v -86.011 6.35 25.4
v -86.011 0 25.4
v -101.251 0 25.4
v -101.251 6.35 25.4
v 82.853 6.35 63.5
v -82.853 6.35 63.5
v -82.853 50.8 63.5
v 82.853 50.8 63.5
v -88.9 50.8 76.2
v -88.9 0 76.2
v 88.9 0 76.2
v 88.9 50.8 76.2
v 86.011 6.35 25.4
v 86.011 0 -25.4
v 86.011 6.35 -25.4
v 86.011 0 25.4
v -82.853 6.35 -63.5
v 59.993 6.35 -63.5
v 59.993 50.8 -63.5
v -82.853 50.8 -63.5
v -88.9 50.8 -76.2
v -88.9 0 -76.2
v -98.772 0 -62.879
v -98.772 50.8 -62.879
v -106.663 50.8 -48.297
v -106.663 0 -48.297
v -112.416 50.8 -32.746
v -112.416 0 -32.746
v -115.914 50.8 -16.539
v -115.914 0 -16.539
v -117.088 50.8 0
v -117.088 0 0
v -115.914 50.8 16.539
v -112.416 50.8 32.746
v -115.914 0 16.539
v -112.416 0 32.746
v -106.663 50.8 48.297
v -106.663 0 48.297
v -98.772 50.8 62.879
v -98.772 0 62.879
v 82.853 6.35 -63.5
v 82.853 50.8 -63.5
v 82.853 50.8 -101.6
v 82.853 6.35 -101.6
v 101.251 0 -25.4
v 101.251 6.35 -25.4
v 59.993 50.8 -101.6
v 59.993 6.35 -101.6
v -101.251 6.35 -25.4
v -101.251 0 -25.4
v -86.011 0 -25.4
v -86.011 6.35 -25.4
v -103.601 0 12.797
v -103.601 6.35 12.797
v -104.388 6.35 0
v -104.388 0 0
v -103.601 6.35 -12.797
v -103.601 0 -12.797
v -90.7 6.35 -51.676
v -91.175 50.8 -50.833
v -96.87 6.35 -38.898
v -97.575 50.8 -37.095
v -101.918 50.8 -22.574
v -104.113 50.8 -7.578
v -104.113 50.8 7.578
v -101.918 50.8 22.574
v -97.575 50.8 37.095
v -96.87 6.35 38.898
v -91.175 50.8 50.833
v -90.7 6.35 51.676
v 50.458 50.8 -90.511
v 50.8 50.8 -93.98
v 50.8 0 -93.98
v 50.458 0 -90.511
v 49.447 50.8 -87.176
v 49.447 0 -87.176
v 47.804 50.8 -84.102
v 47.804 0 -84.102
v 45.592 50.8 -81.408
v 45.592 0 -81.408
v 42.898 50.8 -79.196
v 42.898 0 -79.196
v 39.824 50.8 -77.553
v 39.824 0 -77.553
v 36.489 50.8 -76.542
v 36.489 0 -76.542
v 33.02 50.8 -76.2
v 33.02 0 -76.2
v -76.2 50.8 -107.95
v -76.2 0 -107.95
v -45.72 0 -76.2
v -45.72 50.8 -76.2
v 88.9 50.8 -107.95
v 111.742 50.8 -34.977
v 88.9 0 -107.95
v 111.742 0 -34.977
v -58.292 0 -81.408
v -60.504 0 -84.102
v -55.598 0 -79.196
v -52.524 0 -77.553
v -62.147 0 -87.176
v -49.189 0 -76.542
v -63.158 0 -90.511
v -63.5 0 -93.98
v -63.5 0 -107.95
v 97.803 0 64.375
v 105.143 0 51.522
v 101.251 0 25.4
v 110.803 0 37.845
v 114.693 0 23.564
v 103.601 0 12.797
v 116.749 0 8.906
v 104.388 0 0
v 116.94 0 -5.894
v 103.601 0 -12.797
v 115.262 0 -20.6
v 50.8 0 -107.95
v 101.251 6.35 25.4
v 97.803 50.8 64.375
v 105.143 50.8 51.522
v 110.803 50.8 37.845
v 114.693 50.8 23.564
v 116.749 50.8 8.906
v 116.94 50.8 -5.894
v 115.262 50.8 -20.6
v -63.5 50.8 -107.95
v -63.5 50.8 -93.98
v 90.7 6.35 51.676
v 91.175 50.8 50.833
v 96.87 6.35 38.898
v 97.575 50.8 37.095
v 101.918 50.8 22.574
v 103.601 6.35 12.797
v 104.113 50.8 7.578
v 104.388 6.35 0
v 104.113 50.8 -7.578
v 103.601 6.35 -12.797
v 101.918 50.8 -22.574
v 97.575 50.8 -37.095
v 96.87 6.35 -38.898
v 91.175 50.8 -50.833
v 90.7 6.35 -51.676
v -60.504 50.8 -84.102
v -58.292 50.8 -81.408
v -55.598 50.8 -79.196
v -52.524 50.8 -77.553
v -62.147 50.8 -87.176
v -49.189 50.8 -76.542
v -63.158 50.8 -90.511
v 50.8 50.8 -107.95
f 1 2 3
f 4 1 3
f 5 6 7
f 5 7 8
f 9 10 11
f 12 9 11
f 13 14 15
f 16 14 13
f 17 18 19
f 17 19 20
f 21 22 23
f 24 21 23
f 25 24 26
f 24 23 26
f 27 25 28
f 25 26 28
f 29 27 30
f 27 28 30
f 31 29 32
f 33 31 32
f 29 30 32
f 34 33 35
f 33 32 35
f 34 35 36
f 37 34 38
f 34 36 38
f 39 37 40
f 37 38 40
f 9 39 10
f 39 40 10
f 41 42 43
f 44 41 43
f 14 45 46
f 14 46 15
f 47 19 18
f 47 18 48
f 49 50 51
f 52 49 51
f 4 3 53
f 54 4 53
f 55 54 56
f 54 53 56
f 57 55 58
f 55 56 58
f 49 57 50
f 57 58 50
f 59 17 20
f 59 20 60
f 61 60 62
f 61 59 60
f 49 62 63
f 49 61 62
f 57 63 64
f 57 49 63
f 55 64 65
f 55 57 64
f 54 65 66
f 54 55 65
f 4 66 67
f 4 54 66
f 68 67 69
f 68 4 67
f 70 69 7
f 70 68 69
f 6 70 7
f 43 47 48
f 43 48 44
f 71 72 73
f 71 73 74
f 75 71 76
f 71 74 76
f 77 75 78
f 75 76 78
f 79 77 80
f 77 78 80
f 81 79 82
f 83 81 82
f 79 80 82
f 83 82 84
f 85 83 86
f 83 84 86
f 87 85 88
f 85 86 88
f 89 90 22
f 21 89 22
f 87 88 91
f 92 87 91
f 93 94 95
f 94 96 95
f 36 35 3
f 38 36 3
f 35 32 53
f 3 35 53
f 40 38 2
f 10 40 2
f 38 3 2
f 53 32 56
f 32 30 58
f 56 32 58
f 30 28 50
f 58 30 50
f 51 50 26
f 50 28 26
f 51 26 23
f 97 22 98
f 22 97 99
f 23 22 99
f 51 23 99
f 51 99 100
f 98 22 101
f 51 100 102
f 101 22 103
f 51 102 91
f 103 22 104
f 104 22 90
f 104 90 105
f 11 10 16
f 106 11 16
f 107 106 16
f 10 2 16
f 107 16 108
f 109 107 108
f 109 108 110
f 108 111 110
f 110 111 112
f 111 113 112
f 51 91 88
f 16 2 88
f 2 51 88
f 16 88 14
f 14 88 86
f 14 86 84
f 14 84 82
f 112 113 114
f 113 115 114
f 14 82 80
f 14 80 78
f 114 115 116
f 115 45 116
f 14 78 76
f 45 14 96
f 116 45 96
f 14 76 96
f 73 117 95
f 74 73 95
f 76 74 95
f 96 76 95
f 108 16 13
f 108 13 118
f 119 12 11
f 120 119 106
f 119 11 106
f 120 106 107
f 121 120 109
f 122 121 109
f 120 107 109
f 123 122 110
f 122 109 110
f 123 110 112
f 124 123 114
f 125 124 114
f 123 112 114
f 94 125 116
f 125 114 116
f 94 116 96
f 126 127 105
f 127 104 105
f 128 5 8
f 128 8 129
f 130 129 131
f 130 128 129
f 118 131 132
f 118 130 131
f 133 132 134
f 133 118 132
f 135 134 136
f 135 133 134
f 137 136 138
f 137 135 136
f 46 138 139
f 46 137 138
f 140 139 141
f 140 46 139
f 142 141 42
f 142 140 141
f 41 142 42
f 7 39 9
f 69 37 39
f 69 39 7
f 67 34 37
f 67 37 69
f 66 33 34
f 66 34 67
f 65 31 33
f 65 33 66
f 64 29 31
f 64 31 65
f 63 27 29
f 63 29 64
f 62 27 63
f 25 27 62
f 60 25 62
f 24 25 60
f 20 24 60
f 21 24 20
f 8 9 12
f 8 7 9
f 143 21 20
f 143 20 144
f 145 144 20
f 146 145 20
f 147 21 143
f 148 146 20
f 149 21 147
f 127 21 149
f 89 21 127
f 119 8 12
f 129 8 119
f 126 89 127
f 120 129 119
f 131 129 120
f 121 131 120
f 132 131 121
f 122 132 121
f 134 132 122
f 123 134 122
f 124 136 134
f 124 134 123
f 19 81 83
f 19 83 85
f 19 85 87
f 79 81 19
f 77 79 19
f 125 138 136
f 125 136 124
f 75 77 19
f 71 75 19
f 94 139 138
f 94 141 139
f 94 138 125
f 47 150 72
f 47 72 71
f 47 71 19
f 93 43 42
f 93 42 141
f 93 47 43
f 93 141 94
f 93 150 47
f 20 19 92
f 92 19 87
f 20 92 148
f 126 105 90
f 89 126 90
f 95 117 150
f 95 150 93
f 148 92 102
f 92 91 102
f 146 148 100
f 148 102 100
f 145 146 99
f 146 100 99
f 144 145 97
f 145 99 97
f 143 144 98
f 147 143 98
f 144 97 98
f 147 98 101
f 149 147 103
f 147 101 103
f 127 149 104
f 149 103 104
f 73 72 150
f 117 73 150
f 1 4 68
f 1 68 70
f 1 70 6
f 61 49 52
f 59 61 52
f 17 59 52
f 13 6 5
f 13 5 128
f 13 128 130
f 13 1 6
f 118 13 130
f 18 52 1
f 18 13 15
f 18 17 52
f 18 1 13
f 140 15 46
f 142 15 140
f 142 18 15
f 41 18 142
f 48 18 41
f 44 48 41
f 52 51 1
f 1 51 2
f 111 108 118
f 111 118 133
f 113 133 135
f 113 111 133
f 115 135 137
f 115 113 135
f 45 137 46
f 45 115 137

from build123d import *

# Parameters (mm, degrees)
BOSS_EXTRUDE1_DEPTH = 6.35
BOSS_EXTRUDE2_DEPTH = 44.45
SKETCH4_W           = 12.7
SKETCH4_H           = 31.75
BOSS_EXTRUDE4_DEPTH = 50.8
SKETCH5_W           = 22.86
SKETCH5_H           = 38.1
CUT_EXTRUDE1_DEPTH  = 44.45
FILLET3_R           = 17.78


with BuildPart() as part:
    # Sketch1 → Boss-Extrude1 (new body)
    with BuildSketch(Plane(origin=(0, 0, 0), x_dir=(1, 0, 0), z_dir=(0, 1, 0))):
        with BuildLine():
            Line((-88.9, -76.2), (88.9, -76.2))
            ThreePointArc((88.9, -76.2), (114.692568029, -23.564058203), (111.741834586, 34.977312694))
            Line((111.741834586, 34.977312694), (88.9, 107.95))
            Line((88.9, 107.95), (63.5, 107.95))
            Line((63.5, 107.95), (63.5, 76.2))
            Line((63.5, 76.2), (-63.5, 76.2))
            Line((-63.5, 76.2), (-63.5, 107.95))
            Line((-63.5, 107.95), (-76.2, 107.95))
            Line((-76.2, 107.95), (-88.9, 76.2))
            ThreePointArc((-88.9, 76.2), (-117.088214608, 0), (-88.9, -76.2))
        make_face()
        with BuildLine():
            Line((-101.250873324, 25.4), (-86.010873324, 25.4))
            Line((-86.010873324, 25.4), (-86.010873324, -25.4))
            Line((-86.010873324, -25.4), (-101.250873324, -25.4))
            ThreePointArc((-101.250873324, -25.4), (-104.388214608, 0), (-101.250873324, 25.4))
        make_face(mode=Mode.SUBTRACT)
        with BuildLine():
            Line((86.010873324, -25.4), (101.250873324, -25.4))
            ThreePointArc((101.250873324, -25.4), (104.388214608, 0), (101.250873324, 25.4))
            Line((101.250873324, 25.4), (86.010873324, 25.4))
            Line((86.010873324, 25.4), (86.010873324, -25.4))
        make_face(mode=Mode.SUBTRACT)
    extrude(amount=BOSS_EXTRUDE1_DEPTH)

    # Sketch2 → Boss-Extrude2 (add)
    with BuildSketch(Plane(origin=(0, 6.35, 0), x_dir=(1, 0, 0), z_dir=(0, 1, 0))):
        with BuildLine():
            Line((-88.9, -76.2), (88.9, -76.2))
            ThreePointArc((88.9, -76.2), (114.692568029, -23.564058203), (111.741834586, 34.977312694))
            Line((111.741834586, 34.977312694), (88.9, 107.95))
            Line((88.9, 107.95), (63.5, 107.95))
            Line((63.5, 107.95), (63.5, 76.2))
            Line((63.5, 76.2), (-63.5, 76.2))
            Line((-63.5, 76.2), (-63.5, 107.95))
            Line((-63.5, 107.95), (-76.2, 107.95))
            Line((-76.2, 107.95), (-88.9, 76.2))
            ThreePointArc((-88.9, 76.2), (-117.088214608, 0), (-88.9, -76.2))
        make_face()
        with BuildLine():
            Line((-82.853179474, -63.5), (82.853179474, -63.5))
            ThreePointArc((82.853179474, -63.5), (104.388214608, 0), (82.853179474, 63.5))
            Line((82.853179474, 63.5), (-82.853179474, 63.5))
            ThreePointArc((-82.853179474, 63.5), (-104.388214608, 0), (-82.853179474, -63.5))
        make_face(mode=Mode.SUBTRACT)
    extrude(amount=BOSS_EXTRUDE2_DEPTH)

    # Sketch4 → Boss-Extrude4 (add)
    with BuildSketch(Plane(origin=(0, 50.8, 0), x_dir=(1, 0, 0), z_dir=(0, 1, 0))):
        with Locations((57.15, 92.075)):
            Rectangle(SKETCH4_W, SKETCH4_H)
    extrude(amount=-BOSS_EXTRUDE4_DEPTH)

    # Sketch5 → Cut-Extrude1 (cut)
    with BuildSketch(Plane(origin=(0, 50.8, 0), x_dir=(1, 0, 0), z_dir=(0, 1, 0))):
        with Locations((71.423179474, 82.55)):
            Rectangle(SKETCH5_W, SKETCH5_H)
    extrude(amount=-CUT_EXTRUDE1_DEPTH, mode=Mode.SUBTRACT)

    # Fillet3
    fillet3_edges = [part.edges().sort_by_distance(p)[0] for p in [
        (50.8, 25.4, -76.2),
        (-63.5, 25.4, -76.2),
    ]]
    fillet(fillet3_edges, radius=FILLET3_R)


solid = part.part
